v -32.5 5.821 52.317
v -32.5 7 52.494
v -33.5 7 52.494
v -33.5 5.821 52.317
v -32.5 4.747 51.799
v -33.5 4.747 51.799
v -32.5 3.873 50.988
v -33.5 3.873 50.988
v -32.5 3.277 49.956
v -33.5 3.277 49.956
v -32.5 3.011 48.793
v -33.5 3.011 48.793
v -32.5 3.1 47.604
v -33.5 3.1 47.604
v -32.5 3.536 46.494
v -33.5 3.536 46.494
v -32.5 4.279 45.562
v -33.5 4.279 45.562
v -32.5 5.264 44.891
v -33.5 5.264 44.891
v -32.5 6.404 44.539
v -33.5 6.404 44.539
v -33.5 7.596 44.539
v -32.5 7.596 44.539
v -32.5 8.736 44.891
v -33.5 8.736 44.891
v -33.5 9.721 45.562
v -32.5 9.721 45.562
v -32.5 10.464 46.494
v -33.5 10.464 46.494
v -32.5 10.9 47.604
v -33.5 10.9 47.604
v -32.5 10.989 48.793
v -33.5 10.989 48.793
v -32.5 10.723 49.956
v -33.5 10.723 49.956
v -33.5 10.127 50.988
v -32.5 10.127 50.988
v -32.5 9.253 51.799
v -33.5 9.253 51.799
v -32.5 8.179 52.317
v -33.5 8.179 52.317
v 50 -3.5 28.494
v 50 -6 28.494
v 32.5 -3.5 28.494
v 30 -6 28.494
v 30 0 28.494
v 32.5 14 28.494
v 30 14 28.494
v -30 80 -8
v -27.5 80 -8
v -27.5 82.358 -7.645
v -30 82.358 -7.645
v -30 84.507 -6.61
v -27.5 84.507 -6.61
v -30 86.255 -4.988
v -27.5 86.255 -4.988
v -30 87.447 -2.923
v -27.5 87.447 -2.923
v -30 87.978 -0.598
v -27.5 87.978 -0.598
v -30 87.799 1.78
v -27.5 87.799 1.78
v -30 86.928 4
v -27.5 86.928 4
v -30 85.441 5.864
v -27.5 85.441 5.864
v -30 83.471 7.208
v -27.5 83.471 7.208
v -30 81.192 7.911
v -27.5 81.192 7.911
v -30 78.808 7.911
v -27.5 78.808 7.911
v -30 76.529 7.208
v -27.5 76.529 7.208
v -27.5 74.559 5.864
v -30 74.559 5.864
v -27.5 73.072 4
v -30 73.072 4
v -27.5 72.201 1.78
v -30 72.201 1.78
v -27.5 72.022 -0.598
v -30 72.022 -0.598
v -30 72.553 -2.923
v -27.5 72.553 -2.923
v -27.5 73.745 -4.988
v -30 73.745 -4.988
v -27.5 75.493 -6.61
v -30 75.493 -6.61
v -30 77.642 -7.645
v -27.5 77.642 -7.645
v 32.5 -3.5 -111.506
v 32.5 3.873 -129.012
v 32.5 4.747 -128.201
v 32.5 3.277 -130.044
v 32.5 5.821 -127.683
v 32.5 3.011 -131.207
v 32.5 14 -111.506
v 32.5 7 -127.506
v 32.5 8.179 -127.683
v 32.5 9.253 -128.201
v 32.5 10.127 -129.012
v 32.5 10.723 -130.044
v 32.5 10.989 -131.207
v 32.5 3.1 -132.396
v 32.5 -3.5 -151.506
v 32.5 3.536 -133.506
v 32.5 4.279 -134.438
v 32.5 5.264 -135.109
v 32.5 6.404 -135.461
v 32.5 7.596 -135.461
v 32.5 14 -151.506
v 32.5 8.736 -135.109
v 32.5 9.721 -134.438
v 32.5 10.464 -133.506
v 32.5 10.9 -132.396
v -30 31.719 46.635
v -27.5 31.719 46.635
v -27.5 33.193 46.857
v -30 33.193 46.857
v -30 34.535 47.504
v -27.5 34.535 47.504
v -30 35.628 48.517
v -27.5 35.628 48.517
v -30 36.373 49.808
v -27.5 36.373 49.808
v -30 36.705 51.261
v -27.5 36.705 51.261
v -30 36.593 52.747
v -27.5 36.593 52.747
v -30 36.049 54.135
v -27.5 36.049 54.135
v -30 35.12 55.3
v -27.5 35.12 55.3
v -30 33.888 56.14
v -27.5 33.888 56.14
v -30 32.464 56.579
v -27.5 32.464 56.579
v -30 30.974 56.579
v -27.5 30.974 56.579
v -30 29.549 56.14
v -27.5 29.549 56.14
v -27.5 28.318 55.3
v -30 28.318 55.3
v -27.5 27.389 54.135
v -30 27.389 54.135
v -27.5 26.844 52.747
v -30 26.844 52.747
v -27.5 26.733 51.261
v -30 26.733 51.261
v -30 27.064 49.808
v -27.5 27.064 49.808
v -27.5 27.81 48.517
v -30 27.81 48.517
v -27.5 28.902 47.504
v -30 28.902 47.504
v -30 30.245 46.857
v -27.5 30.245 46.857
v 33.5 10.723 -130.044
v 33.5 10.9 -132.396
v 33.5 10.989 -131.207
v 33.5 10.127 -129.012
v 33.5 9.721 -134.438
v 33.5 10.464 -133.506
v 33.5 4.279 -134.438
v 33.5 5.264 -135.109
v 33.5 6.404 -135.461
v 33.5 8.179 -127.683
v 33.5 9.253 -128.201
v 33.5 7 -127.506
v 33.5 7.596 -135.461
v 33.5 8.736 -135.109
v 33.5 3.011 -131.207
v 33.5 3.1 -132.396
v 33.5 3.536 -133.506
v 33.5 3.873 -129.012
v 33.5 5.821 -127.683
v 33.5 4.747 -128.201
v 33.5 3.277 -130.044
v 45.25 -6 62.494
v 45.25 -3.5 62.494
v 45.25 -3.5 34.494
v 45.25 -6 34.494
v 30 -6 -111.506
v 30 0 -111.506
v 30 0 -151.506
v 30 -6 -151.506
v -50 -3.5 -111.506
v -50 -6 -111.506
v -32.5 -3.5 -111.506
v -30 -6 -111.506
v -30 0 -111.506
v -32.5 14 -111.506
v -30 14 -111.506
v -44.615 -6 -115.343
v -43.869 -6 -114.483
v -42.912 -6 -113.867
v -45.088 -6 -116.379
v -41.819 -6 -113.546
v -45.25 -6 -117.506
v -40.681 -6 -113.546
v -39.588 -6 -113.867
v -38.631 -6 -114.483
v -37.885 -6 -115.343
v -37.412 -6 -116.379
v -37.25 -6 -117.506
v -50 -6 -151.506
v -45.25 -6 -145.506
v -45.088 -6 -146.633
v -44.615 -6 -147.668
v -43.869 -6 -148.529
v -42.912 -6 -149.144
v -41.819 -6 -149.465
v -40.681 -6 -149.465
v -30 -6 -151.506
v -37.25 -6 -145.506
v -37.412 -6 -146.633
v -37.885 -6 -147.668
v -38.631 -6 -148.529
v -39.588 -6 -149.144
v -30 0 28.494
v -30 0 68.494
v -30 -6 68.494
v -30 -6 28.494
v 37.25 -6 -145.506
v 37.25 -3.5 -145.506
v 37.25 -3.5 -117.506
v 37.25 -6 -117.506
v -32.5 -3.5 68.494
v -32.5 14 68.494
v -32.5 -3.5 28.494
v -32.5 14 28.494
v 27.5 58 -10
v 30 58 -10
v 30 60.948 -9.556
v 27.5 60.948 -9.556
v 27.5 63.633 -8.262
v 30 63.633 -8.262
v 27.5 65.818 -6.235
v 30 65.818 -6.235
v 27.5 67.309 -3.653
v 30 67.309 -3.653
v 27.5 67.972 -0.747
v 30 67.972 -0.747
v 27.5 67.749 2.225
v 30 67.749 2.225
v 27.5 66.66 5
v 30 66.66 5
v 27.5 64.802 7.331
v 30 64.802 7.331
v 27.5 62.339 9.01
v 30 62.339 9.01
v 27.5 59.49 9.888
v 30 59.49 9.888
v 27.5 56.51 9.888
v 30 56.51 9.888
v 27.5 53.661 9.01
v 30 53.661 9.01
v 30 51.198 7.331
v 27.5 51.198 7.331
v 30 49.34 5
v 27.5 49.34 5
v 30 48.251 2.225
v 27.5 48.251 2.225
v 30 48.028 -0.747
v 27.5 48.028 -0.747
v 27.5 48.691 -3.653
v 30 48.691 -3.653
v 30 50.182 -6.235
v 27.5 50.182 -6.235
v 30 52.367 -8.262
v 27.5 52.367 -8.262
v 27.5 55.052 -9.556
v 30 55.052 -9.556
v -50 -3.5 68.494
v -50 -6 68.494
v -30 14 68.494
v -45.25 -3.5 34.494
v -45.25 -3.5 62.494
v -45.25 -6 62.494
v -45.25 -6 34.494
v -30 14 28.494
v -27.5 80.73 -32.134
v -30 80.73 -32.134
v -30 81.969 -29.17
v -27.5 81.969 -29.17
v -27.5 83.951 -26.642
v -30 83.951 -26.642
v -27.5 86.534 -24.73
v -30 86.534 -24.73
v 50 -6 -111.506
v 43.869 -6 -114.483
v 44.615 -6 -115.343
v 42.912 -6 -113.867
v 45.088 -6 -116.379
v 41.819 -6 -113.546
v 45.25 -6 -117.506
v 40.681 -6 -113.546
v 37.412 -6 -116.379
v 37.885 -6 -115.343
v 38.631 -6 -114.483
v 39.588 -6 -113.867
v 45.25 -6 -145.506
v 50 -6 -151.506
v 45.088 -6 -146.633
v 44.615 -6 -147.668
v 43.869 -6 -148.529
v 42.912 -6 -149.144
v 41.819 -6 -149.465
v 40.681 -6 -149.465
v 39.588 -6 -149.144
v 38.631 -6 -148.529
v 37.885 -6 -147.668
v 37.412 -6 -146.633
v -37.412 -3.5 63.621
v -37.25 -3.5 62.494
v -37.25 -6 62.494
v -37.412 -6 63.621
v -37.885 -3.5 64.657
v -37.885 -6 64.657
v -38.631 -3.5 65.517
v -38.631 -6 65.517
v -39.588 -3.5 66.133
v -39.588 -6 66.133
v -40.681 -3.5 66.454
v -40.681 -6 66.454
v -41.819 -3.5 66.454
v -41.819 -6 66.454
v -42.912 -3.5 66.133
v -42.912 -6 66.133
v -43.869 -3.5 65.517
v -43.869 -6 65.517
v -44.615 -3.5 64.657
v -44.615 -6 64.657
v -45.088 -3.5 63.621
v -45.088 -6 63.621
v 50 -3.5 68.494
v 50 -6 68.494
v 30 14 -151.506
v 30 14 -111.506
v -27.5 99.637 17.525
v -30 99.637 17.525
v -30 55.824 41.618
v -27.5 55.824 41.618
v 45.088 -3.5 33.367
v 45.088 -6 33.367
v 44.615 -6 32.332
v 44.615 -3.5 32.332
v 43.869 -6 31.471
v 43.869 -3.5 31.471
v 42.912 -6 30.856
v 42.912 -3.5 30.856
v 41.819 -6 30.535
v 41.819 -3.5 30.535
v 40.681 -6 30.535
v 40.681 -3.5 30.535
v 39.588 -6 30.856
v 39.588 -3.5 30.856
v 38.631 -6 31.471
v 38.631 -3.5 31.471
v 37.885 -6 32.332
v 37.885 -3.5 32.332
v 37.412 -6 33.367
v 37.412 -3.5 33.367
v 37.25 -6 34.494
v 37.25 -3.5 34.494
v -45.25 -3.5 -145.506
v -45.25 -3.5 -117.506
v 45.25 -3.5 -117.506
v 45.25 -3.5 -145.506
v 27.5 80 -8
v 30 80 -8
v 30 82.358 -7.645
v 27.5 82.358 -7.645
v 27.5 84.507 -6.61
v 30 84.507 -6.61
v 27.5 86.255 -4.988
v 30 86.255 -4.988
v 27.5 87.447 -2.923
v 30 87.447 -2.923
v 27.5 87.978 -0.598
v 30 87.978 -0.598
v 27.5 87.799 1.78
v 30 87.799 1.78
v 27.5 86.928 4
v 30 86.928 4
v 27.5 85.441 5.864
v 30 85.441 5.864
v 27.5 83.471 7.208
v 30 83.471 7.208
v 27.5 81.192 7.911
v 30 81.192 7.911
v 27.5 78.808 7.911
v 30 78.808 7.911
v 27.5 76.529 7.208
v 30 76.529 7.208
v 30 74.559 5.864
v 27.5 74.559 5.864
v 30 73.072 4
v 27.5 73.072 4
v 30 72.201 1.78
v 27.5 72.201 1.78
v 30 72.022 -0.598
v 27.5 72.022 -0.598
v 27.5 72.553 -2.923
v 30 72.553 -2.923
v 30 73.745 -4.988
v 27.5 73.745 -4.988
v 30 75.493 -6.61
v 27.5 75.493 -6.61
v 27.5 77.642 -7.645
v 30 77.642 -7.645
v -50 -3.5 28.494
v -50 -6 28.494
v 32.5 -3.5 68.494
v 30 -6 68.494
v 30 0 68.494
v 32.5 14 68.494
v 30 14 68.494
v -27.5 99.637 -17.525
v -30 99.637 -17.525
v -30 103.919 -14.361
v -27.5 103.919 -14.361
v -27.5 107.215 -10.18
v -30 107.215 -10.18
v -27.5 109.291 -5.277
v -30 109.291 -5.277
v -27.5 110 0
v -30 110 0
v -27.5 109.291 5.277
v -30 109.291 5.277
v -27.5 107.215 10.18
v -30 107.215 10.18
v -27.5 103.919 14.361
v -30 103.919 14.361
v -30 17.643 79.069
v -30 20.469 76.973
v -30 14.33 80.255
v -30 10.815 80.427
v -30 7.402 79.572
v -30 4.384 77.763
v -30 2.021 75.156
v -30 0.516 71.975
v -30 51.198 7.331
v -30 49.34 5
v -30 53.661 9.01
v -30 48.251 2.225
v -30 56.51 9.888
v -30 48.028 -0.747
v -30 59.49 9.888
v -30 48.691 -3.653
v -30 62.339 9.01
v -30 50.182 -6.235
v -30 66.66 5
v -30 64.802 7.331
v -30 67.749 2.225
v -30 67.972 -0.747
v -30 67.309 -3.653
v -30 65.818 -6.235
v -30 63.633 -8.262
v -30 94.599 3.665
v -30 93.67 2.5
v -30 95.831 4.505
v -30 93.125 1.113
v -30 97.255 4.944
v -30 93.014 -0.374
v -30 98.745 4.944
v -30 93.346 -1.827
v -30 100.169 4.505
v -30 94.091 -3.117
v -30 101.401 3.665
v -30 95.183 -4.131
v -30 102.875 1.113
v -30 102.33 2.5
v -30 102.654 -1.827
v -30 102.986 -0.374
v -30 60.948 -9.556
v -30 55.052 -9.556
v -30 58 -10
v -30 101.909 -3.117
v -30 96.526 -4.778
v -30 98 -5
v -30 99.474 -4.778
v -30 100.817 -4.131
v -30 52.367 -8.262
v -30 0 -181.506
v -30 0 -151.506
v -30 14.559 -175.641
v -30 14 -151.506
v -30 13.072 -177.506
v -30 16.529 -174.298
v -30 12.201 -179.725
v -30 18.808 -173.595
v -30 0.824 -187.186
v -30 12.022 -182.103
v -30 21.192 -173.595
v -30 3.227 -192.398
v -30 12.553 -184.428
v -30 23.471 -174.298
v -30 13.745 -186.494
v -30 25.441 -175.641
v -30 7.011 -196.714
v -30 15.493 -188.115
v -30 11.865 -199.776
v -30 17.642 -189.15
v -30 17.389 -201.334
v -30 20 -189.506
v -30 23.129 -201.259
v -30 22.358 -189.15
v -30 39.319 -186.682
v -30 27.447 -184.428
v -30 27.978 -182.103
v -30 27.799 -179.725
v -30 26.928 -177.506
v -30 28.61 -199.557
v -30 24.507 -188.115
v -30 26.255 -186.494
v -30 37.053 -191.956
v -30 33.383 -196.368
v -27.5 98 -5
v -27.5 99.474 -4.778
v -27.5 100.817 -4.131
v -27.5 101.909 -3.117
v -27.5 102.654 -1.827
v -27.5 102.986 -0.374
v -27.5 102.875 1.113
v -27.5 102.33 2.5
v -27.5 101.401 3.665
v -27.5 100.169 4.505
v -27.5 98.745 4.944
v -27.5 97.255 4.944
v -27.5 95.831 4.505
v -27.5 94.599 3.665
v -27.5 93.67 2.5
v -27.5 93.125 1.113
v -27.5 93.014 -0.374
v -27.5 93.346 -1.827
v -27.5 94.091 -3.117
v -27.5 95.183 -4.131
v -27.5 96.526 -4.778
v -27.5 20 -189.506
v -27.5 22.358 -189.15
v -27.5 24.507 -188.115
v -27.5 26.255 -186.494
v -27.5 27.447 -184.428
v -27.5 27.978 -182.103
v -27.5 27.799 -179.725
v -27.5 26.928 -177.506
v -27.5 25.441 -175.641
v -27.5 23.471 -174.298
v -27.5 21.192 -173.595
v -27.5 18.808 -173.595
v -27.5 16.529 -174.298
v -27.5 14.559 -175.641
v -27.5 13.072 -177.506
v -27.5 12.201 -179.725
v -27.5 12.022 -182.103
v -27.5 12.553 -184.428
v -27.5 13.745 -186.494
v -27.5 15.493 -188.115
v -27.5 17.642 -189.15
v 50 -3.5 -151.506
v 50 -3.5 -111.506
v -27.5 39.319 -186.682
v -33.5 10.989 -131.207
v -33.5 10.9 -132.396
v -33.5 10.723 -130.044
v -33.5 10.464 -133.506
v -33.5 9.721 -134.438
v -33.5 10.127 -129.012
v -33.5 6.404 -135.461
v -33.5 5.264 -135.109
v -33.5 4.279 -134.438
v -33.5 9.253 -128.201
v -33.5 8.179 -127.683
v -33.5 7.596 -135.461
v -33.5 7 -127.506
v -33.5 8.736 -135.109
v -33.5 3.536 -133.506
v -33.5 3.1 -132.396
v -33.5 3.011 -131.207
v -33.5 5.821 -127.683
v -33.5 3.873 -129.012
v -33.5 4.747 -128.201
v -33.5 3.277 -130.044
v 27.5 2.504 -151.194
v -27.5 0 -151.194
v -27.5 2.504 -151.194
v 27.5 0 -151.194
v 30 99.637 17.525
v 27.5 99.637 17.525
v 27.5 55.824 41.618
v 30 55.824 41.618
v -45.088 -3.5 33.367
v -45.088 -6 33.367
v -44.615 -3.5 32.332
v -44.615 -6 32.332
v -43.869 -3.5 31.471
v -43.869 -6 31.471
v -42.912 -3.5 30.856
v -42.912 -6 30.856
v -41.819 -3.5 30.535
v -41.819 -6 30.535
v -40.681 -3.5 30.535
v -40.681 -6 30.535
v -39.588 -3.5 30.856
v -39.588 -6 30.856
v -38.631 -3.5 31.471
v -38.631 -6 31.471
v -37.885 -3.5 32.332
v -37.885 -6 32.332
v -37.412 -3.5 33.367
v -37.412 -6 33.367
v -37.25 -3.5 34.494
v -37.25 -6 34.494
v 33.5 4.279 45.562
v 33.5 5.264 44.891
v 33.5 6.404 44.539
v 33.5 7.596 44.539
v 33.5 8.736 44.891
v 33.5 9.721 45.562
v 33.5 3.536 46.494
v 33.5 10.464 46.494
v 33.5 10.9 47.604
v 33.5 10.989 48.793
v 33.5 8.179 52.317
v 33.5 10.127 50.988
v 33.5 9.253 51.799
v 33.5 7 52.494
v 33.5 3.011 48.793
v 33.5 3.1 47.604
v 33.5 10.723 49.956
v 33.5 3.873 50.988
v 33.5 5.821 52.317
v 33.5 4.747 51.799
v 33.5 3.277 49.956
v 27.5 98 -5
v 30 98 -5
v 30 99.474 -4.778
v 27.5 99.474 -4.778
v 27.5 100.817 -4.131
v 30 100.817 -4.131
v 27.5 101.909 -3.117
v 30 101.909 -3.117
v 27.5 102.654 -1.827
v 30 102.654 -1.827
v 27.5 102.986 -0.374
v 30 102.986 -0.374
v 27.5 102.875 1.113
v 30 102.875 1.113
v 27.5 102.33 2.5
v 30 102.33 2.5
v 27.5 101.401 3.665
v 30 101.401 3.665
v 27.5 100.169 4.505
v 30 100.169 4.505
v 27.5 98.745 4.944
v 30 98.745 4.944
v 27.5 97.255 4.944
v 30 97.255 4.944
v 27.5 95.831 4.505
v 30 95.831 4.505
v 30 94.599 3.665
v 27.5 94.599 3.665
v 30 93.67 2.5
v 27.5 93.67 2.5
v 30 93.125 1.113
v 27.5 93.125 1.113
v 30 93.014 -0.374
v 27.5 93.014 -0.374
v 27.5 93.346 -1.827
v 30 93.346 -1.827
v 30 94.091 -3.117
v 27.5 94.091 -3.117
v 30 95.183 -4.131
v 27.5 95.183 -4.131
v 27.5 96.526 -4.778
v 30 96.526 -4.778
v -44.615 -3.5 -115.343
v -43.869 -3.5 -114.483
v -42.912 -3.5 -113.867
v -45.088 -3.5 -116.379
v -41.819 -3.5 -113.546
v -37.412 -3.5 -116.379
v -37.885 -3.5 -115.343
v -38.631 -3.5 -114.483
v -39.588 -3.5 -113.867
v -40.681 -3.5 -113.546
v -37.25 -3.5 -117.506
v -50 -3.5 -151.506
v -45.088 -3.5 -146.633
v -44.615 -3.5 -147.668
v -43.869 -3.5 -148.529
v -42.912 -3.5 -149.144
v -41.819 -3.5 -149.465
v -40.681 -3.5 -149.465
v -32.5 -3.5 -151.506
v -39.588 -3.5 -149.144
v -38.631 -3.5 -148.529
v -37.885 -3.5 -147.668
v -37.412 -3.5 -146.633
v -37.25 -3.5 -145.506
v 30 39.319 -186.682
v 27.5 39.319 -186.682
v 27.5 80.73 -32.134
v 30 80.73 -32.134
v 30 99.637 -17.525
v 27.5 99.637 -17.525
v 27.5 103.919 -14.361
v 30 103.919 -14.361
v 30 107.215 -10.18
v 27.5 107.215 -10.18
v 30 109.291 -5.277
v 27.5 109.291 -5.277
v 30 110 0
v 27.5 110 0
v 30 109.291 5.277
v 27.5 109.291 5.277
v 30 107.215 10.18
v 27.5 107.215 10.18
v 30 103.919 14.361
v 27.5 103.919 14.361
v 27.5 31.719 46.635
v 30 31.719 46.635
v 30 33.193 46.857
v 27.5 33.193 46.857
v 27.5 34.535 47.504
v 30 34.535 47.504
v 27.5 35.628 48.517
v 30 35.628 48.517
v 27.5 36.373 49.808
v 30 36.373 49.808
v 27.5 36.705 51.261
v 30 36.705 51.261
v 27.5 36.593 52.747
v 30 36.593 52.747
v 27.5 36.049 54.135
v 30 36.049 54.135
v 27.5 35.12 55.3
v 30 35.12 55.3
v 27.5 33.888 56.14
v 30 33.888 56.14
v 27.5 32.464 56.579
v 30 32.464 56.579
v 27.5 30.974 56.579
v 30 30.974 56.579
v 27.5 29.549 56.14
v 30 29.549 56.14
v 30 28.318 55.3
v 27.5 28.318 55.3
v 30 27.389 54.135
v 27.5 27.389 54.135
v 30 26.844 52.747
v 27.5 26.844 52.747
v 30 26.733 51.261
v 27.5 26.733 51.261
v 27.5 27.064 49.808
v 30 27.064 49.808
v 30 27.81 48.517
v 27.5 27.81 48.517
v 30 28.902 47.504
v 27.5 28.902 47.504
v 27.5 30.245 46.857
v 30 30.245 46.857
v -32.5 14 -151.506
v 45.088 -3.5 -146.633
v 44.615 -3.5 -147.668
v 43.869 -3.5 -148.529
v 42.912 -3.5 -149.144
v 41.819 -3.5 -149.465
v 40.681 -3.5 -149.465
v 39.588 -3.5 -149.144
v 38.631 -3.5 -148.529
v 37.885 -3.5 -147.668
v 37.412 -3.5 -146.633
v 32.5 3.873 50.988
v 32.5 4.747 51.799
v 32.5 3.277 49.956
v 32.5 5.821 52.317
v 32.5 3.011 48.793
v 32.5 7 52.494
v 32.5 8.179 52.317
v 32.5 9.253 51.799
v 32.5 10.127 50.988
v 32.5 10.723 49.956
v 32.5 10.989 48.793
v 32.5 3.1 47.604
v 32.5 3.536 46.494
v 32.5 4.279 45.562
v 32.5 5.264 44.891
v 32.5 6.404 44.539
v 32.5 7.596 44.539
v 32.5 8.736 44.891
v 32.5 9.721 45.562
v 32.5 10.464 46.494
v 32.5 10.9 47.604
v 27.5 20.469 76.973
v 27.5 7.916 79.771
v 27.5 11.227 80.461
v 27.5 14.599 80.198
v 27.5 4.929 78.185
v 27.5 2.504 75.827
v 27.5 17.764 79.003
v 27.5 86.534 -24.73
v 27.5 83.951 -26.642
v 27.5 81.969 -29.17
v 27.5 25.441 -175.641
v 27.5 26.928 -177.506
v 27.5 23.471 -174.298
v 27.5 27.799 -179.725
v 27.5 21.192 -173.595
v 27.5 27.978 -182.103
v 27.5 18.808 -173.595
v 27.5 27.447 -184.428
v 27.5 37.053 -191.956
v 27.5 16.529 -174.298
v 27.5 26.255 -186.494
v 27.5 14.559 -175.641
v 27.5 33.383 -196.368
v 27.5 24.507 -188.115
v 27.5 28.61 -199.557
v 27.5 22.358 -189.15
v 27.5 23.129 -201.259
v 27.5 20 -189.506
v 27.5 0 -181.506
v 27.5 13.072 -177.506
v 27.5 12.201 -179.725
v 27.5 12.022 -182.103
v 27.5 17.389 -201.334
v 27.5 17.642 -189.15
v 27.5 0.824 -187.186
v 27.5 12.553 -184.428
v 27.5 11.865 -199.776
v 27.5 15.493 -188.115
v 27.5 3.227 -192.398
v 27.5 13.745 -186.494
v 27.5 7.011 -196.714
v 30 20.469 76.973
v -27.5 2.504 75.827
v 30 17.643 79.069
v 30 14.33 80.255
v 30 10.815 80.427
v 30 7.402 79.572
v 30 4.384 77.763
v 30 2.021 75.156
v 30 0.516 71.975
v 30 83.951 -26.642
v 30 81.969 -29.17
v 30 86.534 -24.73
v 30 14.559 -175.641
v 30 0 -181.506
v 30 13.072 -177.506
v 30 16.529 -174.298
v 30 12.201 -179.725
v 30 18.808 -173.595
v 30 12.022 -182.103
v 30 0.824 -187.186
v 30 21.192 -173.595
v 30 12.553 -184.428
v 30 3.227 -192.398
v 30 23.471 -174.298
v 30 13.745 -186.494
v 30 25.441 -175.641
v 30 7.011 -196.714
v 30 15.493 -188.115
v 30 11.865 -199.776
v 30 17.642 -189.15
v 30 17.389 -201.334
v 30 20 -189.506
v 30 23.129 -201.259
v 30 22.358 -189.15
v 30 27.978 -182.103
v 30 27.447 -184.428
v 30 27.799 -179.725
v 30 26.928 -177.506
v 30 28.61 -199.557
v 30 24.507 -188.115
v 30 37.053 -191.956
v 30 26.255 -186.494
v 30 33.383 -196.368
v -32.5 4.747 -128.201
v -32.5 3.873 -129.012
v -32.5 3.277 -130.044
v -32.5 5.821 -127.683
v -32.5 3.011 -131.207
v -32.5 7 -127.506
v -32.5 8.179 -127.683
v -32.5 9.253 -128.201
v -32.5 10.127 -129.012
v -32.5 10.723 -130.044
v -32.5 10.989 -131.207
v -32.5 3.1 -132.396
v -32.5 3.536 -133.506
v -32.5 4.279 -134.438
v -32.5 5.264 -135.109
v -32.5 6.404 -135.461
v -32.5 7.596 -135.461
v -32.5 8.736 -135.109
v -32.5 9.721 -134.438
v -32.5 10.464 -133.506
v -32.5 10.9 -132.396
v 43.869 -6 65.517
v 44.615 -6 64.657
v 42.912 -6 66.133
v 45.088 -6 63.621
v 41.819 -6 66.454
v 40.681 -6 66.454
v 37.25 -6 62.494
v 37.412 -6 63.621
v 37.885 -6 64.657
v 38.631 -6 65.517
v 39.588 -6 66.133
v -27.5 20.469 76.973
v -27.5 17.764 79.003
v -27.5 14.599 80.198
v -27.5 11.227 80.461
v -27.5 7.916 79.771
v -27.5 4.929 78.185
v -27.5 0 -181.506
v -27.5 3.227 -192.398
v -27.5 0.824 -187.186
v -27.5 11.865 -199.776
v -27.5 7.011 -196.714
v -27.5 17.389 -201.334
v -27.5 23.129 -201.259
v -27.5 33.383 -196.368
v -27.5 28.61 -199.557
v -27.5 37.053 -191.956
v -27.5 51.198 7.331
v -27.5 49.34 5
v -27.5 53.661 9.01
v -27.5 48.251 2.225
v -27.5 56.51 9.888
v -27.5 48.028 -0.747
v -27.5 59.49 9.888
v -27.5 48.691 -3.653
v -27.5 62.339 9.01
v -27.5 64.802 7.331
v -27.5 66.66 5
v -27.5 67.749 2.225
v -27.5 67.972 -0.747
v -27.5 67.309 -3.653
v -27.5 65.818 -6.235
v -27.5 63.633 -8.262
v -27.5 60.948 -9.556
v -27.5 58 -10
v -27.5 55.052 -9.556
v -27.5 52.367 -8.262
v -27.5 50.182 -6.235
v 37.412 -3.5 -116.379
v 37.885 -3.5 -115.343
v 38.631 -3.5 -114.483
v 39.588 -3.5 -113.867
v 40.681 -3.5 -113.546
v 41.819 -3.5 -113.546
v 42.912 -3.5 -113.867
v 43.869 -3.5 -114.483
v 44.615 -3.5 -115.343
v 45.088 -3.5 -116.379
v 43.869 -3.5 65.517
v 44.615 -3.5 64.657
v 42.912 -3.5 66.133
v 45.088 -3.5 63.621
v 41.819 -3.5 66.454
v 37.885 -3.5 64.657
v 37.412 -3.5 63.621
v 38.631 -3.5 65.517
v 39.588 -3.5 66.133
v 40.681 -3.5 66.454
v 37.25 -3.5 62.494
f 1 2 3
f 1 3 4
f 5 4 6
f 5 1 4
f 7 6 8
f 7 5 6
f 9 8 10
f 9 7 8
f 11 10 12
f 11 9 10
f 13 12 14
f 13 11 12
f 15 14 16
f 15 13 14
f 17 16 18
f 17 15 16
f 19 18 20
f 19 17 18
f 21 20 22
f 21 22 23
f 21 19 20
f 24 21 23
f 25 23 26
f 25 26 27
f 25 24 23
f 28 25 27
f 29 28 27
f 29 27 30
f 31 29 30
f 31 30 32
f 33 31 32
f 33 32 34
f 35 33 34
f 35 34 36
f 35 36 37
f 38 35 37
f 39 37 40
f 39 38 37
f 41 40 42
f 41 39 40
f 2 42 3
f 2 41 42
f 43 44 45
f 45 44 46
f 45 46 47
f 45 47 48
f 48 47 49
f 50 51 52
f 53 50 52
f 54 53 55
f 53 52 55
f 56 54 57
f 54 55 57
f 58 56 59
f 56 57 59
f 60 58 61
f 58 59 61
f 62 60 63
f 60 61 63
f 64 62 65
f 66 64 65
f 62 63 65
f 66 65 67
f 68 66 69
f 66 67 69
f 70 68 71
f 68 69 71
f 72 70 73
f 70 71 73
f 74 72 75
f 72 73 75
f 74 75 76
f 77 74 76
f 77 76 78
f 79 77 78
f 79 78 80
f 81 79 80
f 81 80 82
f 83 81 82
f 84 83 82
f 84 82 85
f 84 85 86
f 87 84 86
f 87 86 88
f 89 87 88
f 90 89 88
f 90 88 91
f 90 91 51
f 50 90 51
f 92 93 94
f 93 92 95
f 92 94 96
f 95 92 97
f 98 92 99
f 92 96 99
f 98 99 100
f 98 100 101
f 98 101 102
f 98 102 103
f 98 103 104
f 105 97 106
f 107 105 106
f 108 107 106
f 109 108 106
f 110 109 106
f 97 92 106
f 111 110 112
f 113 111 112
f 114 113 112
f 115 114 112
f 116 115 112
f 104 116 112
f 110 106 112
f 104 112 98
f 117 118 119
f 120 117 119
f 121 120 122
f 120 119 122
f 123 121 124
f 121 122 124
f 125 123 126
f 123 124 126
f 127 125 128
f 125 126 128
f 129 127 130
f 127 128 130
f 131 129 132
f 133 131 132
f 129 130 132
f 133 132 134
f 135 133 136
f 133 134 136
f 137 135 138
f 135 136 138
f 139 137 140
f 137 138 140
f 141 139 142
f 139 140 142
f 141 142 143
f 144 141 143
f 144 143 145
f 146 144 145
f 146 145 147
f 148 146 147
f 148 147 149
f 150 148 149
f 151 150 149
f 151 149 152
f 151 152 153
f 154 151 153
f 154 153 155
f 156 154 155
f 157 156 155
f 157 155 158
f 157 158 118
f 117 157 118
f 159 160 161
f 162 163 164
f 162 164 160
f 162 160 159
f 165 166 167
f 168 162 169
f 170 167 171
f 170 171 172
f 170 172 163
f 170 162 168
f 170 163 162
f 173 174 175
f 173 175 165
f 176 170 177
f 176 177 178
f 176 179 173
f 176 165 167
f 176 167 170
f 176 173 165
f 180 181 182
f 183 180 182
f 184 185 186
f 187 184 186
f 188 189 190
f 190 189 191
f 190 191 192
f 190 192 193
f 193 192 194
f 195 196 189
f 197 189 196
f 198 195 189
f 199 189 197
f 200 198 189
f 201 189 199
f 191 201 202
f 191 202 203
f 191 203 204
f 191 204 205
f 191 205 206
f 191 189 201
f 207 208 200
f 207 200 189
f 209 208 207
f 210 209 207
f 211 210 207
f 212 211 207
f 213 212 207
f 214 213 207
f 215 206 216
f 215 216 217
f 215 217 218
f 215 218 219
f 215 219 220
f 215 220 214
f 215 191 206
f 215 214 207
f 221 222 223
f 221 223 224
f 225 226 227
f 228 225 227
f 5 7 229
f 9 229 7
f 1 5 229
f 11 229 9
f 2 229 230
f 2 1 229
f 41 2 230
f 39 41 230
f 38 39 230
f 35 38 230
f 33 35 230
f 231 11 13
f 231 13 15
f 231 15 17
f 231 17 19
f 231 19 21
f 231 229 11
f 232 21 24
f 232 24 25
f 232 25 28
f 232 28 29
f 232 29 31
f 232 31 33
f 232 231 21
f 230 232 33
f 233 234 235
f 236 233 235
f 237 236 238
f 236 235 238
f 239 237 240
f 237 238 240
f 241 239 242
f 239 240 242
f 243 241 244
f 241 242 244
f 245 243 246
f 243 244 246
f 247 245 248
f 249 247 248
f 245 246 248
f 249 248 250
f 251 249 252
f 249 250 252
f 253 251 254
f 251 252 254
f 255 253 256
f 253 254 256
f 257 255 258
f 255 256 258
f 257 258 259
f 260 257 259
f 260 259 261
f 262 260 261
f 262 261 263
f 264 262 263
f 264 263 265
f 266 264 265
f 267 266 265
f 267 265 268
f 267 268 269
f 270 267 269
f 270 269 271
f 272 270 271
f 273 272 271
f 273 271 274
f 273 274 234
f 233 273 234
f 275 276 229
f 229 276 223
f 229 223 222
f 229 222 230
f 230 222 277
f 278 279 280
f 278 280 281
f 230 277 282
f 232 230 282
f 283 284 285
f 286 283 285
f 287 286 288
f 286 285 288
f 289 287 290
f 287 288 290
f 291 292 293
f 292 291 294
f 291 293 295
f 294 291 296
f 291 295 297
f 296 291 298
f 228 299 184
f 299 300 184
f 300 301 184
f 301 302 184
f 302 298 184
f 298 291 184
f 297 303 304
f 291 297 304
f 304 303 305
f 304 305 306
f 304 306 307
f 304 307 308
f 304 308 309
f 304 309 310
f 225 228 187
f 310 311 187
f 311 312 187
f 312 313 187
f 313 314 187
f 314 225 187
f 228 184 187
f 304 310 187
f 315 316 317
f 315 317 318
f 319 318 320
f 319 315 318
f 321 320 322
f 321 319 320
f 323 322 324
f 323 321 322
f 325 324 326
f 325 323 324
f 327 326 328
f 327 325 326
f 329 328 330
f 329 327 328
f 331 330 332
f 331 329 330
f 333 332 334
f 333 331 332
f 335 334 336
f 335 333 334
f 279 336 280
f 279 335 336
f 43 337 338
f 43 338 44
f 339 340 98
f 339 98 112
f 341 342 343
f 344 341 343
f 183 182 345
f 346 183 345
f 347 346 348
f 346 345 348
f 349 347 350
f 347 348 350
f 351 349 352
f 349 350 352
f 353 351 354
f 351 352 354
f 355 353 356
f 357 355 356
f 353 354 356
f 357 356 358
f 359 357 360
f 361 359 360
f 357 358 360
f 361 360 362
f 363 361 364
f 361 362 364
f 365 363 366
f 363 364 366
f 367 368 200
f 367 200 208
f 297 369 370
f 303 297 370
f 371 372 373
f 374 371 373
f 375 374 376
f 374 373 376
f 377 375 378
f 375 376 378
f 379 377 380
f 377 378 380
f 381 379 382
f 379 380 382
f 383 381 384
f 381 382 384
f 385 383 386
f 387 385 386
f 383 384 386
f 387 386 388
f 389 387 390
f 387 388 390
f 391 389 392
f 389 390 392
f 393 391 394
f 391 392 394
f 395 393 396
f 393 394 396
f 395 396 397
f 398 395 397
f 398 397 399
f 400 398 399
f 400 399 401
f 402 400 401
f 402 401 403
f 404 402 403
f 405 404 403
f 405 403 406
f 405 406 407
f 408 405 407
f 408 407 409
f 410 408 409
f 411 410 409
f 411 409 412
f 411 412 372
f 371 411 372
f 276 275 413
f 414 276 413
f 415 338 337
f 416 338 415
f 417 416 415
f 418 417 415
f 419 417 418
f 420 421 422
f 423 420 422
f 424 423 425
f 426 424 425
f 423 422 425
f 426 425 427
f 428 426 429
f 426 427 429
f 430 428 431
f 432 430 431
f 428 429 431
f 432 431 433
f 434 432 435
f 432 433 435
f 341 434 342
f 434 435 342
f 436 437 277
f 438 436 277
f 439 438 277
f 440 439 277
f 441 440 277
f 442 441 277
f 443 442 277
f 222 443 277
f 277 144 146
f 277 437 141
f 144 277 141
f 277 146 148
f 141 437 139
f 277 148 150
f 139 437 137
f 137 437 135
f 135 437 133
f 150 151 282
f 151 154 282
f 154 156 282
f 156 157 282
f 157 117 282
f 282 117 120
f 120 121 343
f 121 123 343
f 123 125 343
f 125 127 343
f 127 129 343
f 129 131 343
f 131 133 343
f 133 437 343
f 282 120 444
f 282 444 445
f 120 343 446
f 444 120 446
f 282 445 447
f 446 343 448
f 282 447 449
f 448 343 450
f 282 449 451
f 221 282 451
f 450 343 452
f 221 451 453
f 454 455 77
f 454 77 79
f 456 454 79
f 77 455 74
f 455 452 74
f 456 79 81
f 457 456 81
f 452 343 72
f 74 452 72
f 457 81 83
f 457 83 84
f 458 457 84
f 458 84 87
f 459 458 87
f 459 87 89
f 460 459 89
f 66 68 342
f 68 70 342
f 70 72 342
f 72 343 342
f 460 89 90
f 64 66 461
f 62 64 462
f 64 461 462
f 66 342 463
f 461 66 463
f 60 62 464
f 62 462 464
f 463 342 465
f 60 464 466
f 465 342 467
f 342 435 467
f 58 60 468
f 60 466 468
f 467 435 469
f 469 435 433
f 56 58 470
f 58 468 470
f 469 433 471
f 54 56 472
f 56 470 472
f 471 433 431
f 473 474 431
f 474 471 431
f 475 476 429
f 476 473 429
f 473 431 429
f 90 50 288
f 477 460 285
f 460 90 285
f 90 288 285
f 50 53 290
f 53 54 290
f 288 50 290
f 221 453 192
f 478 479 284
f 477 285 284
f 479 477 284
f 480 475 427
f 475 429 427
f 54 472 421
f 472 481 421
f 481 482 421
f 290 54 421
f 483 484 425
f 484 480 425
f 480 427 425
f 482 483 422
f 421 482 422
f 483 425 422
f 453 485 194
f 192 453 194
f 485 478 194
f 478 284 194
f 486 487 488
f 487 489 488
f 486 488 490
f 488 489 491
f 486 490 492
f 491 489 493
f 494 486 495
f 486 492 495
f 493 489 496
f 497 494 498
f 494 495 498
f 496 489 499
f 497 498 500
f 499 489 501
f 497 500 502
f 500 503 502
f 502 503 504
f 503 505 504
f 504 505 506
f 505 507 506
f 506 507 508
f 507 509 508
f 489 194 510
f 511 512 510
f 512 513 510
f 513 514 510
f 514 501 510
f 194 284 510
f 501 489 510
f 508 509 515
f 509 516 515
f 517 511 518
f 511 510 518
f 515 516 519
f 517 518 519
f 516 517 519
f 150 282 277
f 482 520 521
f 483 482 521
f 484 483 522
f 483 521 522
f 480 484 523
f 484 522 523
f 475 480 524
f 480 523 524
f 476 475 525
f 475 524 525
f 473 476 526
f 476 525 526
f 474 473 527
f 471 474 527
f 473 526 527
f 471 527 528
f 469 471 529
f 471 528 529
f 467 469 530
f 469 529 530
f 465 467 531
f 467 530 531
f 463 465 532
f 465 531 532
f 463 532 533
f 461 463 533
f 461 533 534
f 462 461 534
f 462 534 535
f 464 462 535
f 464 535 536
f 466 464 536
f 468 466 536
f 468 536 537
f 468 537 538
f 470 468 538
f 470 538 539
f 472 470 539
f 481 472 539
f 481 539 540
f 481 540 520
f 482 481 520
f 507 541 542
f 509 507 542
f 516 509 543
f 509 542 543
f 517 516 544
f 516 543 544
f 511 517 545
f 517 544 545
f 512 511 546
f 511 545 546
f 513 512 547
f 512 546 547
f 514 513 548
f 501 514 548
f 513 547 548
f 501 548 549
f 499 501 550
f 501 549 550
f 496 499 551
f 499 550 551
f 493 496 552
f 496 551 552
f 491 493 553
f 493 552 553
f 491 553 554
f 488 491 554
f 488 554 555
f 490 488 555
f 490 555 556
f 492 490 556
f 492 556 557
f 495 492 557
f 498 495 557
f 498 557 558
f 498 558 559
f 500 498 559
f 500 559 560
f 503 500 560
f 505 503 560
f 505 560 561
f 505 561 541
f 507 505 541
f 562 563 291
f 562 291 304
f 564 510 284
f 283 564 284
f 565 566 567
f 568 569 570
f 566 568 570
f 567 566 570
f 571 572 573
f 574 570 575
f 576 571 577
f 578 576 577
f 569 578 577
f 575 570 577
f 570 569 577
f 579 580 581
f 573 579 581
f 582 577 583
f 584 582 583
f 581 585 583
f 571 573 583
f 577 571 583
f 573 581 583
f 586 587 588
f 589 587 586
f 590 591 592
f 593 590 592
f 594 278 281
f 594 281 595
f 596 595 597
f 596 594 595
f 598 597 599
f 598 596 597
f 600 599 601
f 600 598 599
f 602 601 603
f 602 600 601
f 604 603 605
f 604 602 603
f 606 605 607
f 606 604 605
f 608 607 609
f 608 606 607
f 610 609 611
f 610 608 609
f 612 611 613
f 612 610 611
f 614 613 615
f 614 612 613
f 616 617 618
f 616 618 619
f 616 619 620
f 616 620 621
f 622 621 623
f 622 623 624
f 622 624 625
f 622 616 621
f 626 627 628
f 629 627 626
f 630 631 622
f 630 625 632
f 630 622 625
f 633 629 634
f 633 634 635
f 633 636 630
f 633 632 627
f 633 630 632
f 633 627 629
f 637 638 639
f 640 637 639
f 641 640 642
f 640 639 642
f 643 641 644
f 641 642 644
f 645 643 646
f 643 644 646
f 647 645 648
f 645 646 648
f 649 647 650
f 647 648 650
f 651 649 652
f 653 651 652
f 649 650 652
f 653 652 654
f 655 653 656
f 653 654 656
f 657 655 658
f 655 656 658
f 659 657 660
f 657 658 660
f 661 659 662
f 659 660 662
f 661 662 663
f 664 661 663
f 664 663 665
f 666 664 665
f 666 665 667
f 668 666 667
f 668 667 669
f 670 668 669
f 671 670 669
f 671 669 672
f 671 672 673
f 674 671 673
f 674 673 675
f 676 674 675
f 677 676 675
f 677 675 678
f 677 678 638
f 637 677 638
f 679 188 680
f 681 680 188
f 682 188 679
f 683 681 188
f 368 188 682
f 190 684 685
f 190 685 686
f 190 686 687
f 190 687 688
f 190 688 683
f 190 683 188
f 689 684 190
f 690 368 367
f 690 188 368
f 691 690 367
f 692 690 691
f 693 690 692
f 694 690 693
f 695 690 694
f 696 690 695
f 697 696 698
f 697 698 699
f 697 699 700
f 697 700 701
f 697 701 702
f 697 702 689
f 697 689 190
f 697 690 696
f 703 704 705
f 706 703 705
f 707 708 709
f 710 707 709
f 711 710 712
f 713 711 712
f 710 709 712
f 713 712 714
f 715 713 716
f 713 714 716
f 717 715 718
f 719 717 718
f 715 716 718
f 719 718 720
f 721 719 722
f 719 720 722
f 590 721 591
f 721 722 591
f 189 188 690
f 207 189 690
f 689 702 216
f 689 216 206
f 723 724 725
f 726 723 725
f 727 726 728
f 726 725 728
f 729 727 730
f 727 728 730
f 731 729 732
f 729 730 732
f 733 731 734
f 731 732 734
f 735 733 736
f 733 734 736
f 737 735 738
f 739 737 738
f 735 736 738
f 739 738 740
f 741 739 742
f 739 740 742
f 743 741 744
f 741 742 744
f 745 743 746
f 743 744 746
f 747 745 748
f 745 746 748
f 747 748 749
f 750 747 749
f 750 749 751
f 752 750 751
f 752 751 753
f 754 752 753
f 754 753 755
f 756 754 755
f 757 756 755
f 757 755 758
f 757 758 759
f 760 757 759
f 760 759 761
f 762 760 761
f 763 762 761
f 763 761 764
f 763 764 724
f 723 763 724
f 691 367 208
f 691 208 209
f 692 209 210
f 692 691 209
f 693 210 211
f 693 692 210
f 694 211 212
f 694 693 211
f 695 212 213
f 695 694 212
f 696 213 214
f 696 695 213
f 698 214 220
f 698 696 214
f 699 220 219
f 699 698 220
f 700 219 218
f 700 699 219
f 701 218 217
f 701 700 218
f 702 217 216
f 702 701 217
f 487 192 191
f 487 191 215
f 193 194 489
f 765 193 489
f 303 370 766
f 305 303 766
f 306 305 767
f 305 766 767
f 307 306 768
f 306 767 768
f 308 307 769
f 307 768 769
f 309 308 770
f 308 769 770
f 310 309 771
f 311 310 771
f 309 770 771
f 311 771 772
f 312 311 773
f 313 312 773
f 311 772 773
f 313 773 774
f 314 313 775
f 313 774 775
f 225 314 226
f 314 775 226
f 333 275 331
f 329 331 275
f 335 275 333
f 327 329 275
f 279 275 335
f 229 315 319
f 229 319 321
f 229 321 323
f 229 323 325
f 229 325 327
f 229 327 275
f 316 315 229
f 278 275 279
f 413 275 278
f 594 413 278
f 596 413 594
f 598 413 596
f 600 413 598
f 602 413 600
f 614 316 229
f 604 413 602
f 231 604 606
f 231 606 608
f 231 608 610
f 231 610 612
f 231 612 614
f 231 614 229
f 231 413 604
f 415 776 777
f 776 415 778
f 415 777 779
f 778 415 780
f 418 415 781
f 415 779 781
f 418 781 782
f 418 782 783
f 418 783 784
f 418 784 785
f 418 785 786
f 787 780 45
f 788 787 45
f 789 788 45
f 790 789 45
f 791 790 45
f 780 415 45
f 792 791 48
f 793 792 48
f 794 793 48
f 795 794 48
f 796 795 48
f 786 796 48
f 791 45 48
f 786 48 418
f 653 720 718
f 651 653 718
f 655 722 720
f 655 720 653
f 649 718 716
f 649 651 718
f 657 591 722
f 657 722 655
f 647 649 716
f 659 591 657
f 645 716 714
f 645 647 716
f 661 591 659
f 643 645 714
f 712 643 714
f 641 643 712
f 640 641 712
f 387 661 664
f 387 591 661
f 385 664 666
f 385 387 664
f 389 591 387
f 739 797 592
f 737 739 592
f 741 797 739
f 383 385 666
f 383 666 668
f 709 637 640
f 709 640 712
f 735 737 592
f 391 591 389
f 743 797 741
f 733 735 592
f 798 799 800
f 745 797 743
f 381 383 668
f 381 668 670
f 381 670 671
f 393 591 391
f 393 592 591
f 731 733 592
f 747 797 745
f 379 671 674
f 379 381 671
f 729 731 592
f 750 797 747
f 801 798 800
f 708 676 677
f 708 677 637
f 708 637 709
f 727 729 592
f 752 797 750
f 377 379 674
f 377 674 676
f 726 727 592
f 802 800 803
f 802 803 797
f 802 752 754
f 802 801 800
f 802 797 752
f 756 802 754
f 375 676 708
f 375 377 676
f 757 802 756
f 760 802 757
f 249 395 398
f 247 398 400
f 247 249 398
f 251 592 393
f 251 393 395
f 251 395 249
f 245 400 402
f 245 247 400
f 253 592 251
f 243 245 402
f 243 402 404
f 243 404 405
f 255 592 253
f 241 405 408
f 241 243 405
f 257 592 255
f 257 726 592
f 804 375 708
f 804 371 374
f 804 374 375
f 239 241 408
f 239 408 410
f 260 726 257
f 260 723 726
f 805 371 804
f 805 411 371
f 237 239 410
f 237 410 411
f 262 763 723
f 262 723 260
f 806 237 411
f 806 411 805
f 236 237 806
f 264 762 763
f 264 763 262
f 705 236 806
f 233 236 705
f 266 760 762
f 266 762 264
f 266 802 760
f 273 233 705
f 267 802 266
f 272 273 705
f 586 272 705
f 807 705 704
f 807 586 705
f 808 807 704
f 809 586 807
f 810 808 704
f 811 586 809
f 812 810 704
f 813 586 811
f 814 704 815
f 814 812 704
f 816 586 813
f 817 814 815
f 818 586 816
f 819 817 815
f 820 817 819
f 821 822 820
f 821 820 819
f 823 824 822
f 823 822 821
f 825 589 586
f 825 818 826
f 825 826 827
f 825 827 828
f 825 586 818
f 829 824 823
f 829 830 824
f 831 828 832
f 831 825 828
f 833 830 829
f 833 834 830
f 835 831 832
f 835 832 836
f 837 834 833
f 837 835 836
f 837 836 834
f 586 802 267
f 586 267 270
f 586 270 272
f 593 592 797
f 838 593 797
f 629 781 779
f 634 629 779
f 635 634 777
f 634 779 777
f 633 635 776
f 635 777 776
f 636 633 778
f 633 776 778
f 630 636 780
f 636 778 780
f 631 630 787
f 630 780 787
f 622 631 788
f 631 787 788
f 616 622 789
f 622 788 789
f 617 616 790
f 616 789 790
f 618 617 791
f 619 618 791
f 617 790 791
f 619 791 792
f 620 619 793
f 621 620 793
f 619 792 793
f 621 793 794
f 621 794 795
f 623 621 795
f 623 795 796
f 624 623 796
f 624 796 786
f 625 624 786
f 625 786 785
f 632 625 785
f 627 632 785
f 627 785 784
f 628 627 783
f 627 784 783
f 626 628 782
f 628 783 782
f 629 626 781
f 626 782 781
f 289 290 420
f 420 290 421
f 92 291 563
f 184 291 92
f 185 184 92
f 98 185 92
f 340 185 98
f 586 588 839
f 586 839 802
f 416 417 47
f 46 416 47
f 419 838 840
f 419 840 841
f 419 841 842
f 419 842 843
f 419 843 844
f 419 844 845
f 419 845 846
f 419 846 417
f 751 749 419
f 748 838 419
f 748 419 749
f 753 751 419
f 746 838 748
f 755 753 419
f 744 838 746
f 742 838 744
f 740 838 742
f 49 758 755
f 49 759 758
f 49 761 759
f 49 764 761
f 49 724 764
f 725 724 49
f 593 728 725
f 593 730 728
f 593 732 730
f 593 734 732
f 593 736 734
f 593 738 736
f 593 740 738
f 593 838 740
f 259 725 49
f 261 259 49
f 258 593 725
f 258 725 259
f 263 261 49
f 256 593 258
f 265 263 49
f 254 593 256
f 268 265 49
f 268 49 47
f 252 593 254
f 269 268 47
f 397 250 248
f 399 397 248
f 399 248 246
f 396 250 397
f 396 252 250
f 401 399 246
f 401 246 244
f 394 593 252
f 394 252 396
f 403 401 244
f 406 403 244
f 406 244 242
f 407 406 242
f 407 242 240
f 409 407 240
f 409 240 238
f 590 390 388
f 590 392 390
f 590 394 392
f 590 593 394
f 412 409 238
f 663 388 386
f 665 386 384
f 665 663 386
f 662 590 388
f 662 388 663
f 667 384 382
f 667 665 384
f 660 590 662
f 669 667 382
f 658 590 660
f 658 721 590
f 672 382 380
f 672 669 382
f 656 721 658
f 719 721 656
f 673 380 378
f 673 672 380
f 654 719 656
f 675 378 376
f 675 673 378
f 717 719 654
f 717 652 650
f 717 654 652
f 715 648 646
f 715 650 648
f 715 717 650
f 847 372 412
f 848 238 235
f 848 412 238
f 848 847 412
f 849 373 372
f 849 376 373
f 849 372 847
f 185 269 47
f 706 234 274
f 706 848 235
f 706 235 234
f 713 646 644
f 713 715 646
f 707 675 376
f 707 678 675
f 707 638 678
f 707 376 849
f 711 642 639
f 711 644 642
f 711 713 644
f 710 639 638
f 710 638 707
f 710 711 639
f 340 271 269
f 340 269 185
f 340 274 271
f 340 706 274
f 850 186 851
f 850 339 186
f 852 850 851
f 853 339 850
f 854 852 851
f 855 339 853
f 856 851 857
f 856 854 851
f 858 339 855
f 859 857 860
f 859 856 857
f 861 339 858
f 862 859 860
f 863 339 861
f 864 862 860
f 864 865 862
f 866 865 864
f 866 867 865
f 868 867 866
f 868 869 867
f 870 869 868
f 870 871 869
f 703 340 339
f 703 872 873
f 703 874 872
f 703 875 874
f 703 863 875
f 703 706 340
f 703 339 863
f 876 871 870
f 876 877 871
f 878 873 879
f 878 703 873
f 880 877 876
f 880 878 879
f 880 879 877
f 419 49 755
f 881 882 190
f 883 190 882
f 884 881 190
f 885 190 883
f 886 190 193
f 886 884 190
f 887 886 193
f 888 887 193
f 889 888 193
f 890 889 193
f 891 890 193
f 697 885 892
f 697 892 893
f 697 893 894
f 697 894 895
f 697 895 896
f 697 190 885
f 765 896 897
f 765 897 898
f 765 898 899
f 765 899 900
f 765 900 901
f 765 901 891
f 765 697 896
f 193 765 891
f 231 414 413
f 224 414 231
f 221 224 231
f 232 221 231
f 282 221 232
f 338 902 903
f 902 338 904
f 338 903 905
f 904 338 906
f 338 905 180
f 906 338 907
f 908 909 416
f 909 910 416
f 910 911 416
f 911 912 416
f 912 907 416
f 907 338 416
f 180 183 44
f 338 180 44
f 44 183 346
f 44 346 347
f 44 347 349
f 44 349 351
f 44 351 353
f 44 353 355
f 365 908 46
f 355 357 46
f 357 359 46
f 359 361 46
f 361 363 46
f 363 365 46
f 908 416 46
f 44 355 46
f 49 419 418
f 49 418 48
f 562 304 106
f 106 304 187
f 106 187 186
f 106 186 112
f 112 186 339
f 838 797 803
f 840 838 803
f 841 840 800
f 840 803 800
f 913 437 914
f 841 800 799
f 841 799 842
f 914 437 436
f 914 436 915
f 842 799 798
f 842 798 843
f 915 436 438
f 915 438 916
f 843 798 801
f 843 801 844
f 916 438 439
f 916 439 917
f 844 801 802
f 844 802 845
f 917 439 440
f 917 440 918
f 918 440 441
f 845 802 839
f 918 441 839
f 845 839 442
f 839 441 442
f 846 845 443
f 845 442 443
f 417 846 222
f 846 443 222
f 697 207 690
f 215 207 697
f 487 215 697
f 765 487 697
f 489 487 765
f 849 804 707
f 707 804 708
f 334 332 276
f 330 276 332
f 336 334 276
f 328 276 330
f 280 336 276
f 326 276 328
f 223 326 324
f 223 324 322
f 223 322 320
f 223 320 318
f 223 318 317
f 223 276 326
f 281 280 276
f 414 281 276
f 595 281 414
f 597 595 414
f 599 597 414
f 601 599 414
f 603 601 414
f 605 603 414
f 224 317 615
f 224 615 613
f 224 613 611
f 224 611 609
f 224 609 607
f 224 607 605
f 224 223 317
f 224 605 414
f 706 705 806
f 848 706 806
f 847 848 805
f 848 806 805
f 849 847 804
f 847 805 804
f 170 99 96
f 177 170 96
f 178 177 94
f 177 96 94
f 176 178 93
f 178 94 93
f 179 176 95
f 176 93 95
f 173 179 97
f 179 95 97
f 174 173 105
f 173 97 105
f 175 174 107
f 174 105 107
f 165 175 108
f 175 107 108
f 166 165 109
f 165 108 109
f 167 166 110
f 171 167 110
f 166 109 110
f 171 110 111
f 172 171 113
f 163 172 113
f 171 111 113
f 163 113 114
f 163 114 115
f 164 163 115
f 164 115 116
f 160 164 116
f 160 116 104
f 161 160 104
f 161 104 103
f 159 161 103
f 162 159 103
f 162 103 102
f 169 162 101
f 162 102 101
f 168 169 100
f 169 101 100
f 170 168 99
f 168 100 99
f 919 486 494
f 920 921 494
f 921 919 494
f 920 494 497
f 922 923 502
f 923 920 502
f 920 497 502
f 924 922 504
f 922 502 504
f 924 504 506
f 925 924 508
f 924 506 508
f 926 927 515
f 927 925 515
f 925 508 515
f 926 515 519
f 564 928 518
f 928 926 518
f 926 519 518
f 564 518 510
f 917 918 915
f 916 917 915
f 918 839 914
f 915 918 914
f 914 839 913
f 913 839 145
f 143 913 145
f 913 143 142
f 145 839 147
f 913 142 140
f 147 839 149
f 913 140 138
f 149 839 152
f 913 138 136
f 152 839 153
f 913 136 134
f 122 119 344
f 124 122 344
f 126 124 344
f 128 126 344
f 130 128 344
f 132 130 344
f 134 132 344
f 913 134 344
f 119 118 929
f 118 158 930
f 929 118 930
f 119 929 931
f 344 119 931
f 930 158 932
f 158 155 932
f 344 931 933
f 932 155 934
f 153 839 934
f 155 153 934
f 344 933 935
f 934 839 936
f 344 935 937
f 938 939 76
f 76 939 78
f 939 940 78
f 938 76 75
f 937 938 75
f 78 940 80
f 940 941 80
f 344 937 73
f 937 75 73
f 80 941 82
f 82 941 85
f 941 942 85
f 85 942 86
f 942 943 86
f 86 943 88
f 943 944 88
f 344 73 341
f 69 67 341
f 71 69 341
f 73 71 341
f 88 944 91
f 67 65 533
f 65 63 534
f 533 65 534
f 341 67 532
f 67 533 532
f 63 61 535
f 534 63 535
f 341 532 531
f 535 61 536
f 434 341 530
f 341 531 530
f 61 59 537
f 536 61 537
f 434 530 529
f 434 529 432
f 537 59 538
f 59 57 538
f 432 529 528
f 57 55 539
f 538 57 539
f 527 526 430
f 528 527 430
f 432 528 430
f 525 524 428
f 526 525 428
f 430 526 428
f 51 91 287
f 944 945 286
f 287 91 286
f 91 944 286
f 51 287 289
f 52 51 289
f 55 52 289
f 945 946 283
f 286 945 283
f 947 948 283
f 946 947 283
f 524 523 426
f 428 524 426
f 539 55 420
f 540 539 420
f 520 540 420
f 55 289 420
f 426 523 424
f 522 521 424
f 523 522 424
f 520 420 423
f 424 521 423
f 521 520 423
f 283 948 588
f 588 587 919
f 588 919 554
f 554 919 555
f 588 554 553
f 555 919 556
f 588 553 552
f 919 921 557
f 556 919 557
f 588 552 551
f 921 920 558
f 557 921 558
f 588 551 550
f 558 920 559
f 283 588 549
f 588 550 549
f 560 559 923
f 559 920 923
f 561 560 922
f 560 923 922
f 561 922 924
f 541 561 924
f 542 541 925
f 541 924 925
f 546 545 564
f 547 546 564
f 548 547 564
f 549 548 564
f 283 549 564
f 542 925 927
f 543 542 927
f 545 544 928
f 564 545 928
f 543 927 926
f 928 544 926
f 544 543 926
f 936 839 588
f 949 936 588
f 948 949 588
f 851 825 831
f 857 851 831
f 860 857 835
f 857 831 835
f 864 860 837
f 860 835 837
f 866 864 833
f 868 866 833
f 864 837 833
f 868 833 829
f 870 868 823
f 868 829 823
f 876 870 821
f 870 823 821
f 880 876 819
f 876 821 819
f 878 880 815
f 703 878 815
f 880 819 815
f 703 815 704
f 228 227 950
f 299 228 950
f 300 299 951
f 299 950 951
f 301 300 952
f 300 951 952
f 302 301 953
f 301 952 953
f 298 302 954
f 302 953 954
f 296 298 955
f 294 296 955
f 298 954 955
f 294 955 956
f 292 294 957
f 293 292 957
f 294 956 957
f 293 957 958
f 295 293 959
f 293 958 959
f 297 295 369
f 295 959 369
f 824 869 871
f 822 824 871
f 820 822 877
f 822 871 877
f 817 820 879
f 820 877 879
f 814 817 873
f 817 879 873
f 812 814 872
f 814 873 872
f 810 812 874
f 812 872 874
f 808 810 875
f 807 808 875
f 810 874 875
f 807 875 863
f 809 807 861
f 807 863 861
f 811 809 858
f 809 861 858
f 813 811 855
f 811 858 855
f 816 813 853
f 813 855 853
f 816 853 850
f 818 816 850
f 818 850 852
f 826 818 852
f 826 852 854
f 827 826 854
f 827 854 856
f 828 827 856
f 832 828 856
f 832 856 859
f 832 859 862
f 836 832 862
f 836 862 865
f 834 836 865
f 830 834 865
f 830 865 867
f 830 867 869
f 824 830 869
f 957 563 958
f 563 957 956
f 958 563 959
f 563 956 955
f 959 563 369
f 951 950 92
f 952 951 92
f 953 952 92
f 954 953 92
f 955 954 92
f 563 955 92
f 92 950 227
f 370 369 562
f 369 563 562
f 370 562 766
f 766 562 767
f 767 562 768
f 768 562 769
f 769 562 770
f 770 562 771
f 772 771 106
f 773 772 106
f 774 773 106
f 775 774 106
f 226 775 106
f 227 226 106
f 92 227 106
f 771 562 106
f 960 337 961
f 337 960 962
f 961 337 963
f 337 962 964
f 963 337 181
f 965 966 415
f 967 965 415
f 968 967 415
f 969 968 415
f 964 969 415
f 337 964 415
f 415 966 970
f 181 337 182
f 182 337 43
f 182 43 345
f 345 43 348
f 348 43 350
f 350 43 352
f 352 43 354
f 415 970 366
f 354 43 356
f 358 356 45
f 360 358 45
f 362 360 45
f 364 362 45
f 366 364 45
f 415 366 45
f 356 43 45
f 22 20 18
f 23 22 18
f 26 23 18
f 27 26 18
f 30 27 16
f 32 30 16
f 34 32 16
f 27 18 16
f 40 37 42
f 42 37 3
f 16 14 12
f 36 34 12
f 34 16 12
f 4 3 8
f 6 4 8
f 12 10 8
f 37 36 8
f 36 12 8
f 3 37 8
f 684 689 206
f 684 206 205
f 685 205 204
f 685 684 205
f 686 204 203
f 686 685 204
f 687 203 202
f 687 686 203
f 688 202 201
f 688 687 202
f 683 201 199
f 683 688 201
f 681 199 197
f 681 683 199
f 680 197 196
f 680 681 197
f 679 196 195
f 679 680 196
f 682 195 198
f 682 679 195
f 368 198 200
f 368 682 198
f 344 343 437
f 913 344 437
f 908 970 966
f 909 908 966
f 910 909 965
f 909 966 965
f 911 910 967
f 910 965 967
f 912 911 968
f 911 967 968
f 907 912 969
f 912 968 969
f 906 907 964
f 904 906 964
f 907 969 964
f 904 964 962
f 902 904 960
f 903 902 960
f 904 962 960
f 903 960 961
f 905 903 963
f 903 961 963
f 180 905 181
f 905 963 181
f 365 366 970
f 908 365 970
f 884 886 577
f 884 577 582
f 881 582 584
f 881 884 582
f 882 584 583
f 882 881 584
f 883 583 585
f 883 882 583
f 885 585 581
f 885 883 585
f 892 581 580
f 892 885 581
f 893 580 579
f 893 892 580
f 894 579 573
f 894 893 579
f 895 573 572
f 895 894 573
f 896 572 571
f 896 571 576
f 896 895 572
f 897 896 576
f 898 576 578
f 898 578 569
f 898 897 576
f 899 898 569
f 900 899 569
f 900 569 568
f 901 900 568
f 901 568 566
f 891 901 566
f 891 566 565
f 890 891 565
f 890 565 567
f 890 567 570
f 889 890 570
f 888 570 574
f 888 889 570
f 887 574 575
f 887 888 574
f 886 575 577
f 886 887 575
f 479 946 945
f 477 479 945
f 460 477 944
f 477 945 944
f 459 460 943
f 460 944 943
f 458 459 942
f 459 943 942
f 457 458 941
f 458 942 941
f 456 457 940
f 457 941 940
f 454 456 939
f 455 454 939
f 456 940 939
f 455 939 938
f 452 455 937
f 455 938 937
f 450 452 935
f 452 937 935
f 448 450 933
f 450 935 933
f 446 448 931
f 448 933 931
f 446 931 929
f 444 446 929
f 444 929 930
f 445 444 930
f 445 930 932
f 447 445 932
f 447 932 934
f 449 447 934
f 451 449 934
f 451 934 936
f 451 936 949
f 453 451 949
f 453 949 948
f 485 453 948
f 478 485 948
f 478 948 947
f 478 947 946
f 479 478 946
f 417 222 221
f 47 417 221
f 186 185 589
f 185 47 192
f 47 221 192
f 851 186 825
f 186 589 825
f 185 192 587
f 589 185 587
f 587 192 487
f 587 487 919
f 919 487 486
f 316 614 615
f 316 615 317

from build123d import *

# Parameters (mm, degrees)
DODANIE_WYCI_GNI_CIE1_DEPTH      = 30
DODANIE_WYCI_GNI_CIE1_DEPTH_BACK = 30
WYTNIJ_WYCI_GNI_CIE1_DEPTH       = 232.526456676
WYTNIJ_WYCI_GNI_CIE1_DEPTH_BACK  = 232.526456676
SZKIC2_W                         = 55
SZKIC2_H                         = 107.496477766
SZKIC3_W                         = 55
SZKIC3_H                         = 40
WYTNIJ_WYCI_GNI_CIE3_DEPTH       = 232.526456676
SZKIC4_W                         = 40
SZKIC4_H                         = 20
DODANIE_WYCI_GNI_CIE2_DEPTH      = 20
SZKIC5_W                         = 17.5
SZKIC5_H                         = 17.5
WYTNIJ_WYCI_GNI_CIE4_DEPTH       = 262.571382555
SZKIC6_R                         = 4
DODANIE_WYCI_GNI_CIE3_DEPTH      = 1
WYTNIJ_WYCI_GNI_CIE5_DEPTH       = 237.615194231
SZKIC8_R                         = 5
SZKIC8_R_2                       = 8
SZKIC8_R_3                       = 10
WYTNIJ_WYCI_GNI_CIE6_DEPTH       = 244.114171


with BuildPart() as part:
    # Szkic1 → Dodanie-wyciągnięcie1 (new, two sides: drawn at the far end of the back side and taken through both)
    with BuildSketch(Plane(origin=(0, 0, 0), x_dir=(0, 0, -1), z_dir=(1, 0, 0)).offset(-DODANIE_WYCI_GNI_CIE1_DEPTH_BACK)):
        with BuildLine():
            Line((0, 0), (181.505583399, 0))
            ThreePointArc((181.505583399, 0), (201.334480627, 17.389476156), (186.681964301, 39.318516526))
            Line((186.681964301, 39.318516526), (32.133832095, 80.729563742))
            ThreePointArc((32.133832095, 80.729563742), (27.839163279, 82.875338226), (24.730497196, 86.533852072))
            Line((24.730497196, 86.533852072), (17.525057128, 99.637031321))
            ThreePointArc((17.525057128, 99.637031321), (0, 110), (-17.525057128, 99.637031321))
            Line((-17.525057128, 99.637031321), (-41.617635429, 55.824388502))
            Line((-41.617635429, 55.824388502), (-76.972974488, 20.469049442))
            ThreePointArc((-76.972974488, 20.469049442), (-79.572186332, 7.401929091), (-68.494416601, 0))
            Line((-68.494416601, 0), (0, 0))
        make_face()
    extrude(amount=DODANIE_WYCI_GNI_CIE1_DEPTH + DODANIE_WYCI_GNI_CIE1_DEPTH_BACK)

    # Szkic2 → Wytnij-wyciągnięcie1 (cut, two sides: drawn at the far end of the back side and taken through both)
    with BuildSketch(Plane.XY.offset(-WYTNIJ_WYCI_GNI_CIE1_DEPTH_BACK)):
        with Locations((0, 56.251761117)):
            Rectangle(SZKIC2_W, SZKIC2_H)
    extrude(amount=WYTNIJ_WYCI_GNI_CIE1_DEPTH + WYTNIJ_WYCI_GNI_CIE1_DEPTH_BACK, mode=Mode.SUBTRACT)

    # Szkic3 → Wytnij-wyciągnięcie3 (cut, through all)
    with BuildSketch(Plane(origin=(0, 0, 0), x_dir=(1, 0, 0), z_dir=(0, 1, 0))):
        with Locations((0, 171.194405091)):
            Rectangle(SZKIC3_W, SZKIC3_H)
    extrude(amount=WYTNIJ_WYCI_GNI_CIE3_DEPTH, mode=Mode.SUBTRACT)

    # Szkic4 → Dodanie-wyciągnięcie2 (add)
    with BuildSketch(Plane(origin=(30, 0, 0), x_dir=(0, 0, -1), z_dir=(1, 0, 0))):
        with Locations((-48.494416601, 4)):
            Rectangle(SZKIC4_W, SZKIC4_H)
        with Locations((131.505583399, 4)):
            Rectangle(SZKIC4_W, SZKIC4_H)
    dodanie_wyci_gni_cie2 = extrude(amount=DODANIE_WYCI_GNI_CIE2_DEPTH)

    # Szkic5 → Wytnij-wyciągnięcie4 (cut, through all)
    with BuildSketch(Plane(origin=(0, 0, -151.505583399), x_dir=(-1, 0, 0), z_dir=(0, 0, -1))):
        with Locations((-41.25, 5.25)):
            Rectangle(SZKIC5_W, SZKIC5_H)
    wytnij_wyci_gni_cie4 = extrude(amount=-WYTNIJ_WYCI_GNI_CIE4_DEPTH, mode=Mode.SUBTRACT)

    # Szkic6 → Dodanie-wyciągnięcie3 (add)
    with BuildSketch(Plane(origin=(32.5, 0, 0), x_dir=(0, 0, -1), z_dir=(1, 0, 0))):
        with Locations((-48.494416601, 7)):
            Circle(SZKIC6_R)
        with Locations((131.505583399, 7)):
            Circle(SZKIC6_R)
    dodanie_wyci_gni_cie3 = extrude(amount=DODANIE_WYCI_GNI_CIE3_DEPTH)

    # Lustro2: Dodanie-wyciągnięcie2, Wytnij-wyciągnięcie4, Dodanie-wyciągnięcie3 across plane
    add(dodanie_wyci_gni_cie2.mirror(Plane(origin=(0, 0, 0), x_dir=(0, 0, 1), z_dir=(1, 0, 0))))
    add(wytnij_wyci_gni_cie4.mirror(Plane(origin=(0, 0, 0), x_dir=(0, 0, 1), z_dir=(1, 0, 0))), mode=Mode.SUBTRACT)
    add(dodanie_wyci_gni_cie3.mirror(Plane(origin=(0, 0, 0), x_dir=(0, 0, 1), z_dir=(1, 0, 0))))

    # Szkic7 → Wytnij-wyciągnięcie5 (cut, through all)
    with BuildSketch(Plane(origin=(0, -3.5, 0), x_dir=(1, 0, 0), z_dir=(0, 1, 0))):
        with BuildLine():
            Line((-37.25, 145.505583399), (-37.25, 117.505583399))
            ThreePointArc((-37.25, 117.505583399), (-41.25, 113.505583399), (-45.25, 117.505583399))
            Line((-45.25, 117.505583399), (-45.25, 145.505583399))
            ThreePointArc((-45.25, 145.505583399), (-41.25, 149.505583399), (-37.25, 145.505583399))
        make_face()
        with BuildLine():
            Line((-37.25, -34.494416601), (-37.25, -62.494416601))
            ThreePointArc((-37.25, -62.494416601), (-41.25, -66.494416601), (-45.25, -62.494416601))
            Line((-45.25, -62.494416601), (-45.25, -34.494416601))
            ThreePointArc((-45.25, -34.494416601), (-41.25, -30.494416601), (-37.25, -34.494416601))
        make_face()
    wytnij_wyci_gni_cie5 = extrude(amount=-WYTNIJ_WYCI_GNI_CIE5_DEPTH, mode=Mode.SUBTRACT)

    # Lustro3: Wytnij-wyciągnięcie5 across plane
    add(wytnij_wyci_gni_cie5.mirror(Plane(origin=(0, 0, 0), x_dir=(0, 0, 1), z_dir=(1, 0, 0))), mode=Mode.SUBTRACT)

    # Szkic8 → Wytnij-wyciągnięcie6 (cut, through all)
    with BuildSketch(Plane(origin=(30, 0, 0), x_dir=(0, 0, -1), z_dir=(1, 0, 0))):
        with Locations((0, 98)):
            Circle(SZKIC8_R)
        with Locations((-51.634860528, 31.718842875)):
            Circle(SZKIC8_R)
        with Locations((0, 80)):
            Circle(SZKIC8_R_2)
        with Locations((0, 58)):
            Circle(SZKIC8_R_3)
        with Locations((181.505583399, 20)):
            Circle(SZKIC8_R_2)
    extrude(amount=-WYTNIJ_WYCI_GNI_CIE6_DEPTH, mode=Mode.SUBTRACT)


solid = part.part
